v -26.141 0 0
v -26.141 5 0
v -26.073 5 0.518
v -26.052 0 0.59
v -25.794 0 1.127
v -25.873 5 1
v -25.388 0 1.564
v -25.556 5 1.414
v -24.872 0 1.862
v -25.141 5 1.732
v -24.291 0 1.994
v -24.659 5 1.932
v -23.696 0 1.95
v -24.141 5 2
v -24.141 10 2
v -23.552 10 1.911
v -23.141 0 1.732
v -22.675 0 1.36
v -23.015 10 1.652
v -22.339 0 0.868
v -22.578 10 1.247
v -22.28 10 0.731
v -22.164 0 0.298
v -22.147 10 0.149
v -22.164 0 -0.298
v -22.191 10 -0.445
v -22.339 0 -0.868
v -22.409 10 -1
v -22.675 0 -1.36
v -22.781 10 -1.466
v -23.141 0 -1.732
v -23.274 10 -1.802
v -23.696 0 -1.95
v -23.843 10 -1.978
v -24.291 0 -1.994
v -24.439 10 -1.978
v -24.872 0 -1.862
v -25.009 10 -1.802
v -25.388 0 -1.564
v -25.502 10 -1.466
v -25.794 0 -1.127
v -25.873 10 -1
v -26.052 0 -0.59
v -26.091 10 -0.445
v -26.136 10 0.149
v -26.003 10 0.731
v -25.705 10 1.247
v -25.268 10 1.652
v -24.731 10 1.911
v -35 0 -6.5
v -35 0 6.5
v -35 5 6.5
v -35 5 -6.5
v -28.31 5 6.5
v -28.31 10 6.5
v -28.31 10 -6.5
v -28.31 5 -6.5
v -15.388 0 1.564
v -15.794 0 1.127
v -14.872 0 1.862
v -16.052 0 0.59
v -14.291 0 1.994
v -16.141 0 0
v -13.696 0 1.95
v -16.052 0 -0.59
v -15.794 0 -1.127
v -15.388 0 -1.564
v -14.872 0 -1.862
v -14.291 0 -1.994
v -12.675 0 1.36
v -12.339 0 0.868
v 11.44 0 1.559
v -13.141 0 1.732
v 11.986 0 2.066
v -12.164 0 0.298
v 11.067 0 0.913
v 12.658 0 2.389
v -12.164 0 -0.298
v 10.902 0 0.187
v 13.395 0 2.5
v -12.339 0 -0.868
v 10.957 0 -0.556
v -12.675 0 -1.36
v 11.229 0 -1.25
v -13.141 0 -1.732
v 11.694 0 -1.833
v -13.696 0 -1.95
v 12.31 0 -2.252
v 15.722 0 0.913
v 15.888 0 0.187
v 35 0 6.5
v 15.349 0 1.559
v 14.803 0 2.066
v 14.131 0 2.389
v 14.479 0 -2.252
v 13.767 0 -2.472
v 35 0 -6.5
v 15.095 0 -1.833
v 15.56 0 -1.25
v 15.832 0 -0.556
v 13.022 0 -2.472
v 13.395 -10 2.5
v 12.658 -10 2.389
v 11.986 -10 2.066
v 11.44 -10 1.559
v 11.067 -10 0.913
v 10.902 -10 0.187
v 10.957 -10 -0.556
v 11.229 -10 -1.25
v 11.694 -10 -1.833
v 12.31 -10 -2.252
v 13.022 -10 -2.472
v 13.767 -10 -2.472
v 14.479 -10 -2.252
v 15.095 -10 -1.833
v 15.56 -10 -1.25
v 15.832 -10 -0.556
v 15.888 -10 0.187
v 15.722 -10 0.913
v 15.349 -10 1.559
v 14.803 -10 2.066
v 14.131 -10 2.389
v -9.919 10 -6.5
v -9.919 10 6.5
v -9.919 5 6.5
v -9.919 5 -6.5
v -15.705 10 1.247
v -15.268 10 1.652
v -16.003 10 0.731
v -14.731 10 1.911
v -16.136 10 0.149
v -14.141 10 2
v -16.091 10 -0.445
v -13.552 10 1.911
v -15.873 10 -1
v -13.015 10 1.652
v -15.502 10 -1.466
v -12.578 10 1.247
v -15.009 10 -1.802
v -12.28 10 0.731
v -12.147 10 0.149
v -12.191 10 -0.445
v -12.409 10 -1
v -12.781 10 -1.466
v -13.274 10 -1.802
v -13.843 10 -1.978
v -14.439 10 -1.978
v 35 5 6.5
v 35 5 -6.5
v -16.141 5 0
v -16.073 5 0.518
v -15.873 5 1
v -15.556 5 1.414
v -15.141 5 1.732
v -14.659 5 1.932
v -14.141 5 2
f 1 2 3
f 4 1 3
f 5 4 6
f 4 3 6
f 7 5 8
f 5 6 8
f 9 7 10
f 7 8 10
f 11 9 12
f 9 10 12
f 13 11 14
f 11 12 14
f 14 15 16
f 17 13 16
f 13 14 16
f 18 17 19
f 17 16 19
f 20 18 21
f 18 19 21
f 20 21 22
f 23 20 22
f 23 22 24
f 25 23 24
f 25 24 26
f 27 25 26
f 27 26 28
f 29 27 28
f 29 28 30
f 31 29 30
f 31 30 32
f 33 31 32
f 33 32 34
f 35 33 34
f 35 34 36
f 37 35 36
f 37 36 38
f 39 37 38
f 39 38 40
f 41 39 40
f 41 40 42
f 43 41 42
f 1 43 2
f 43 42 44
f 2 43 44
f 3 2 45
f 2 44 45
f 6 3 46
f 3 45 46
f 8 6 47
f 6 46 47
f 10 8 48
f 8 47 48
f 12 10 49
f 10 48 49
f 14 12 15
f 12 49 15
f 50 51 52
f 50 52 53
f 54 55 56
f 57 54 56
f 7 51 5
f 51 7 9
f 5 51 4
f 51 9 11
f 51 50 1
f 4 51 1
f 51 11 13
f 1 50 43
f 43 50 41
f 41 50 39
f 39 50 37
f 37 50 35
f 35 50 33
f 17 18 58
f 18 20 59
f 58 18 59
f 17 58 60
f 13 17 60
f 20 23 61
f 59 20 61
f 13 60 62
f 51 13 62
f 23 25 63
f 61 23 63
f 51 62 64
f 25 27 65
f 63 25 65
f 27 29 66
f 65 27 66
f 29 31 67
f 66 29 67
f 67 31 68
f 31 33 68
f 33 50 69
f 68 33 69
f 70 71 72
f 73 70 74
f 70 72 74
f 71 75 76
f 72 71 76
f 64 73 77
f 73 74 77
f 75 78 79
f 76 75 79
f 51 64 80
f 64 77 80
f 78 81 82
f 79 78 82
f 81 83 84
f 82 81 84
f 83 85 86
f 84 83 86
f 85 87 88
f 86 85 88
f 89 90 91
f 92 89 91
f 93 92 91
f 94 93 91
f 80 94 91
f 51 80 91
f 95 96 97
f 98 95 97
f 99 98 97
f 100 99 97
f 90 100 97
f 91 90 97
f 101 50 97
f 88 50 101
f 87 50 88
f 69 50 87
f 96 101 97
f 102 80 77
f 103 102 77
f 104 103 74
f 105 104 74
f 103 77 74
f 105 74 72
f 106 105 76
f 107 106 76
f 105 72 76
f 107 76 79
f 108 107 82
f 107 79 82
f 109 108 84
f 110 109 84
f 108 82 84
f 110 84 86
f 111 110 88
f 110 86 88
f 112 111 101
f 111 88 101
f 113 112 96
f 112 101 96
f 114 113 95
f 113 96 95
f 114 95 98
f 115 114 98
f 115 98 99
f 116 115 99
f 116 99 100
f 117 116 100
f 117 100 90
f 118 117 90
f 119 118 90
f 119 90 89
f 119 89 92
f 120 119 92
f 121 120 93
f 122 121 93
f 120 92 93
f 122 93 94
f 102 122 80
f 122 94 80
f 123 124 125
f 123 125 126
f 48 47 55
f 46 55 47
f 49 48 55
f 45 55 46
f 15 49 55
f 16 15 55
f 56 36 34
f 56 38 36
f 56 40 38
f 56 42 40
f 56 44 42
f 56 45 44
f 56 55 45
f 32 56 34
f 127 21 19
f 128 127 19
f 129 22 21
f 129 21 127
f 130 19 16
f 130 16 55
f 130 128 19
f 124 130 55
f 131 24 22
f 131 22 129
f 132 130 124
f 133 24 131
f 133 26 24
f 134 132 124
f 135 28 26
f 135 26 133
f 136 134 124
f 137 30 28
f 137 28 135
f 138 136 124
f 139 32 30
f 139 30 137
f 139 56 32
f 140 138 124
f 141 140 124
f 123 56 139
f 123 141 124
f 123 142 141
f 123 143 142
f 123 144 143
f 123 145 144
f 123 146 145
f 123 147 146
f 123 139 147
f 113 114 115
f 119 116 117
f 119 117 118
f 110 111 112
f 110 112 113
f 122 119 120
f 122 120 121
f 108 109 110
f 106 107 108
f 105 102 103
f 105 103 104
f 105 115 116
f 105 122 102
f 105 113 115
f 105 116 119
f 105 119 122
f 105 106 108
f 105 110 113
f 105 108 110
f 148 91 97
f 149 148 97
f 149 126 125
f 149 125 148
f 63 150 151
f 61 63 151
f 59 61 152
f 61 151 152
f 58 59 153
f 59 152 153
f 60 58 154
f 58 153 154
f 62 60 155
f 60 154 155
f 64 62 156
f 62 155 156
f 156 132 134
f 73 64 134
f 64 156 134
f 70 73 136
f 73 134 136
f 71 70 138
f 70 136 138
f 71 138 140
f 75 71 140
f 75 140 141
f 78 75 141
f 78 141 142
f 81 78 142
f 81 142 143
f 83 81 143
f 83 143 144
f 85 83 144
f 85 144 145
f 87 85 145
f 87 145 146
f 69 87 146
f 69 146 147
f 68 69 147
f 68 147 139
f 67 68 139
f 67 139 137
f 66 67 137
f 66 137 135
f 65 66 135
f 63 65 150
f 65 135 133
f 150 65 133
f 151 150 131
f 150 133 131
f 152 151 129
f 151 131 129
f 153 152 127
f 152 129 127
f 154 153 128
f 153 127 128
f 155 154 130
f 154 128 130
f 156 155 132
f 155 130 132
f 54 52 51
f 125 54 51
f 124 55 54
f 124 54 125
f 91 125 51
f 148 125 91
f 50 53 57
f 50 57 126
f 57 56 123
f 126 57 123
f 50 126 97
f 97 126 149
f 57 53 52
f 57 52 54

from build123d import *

# Parameters (mm, degrees)
SKETCH1_W           = 70
SKETCH1_H           = 13
BOSS_EXTRUDE1_DEPTH = 5
SKETCH2_R           = 2
CUT_EXTRUDE1_DEPTH  = 36.947878936
BOSS_EXTRUDE3_START = 5
SKETCH2_3_W         = 18.390349325
SKETCH2_3_H         = 13
SKETCH2_3_R         = 2
BOSS_EXTRUDE3_DEPTH = 5
SKETCH3_R           = 2.5
BOSS_EXTRUDE4_DEPTH = 10


with BuildPart() as part:
    # Sketch1 → Boss-Extrude1 (new body)
    with BuildSketch(Plane(origin=(0, 0, 0), x_dir=(1, 0, 0), z_dir=(0, 1, 0))):
        Rectangle(SKETCH1_W, SKETCH1_H)
    extrude(amount=BOSS_EXTRUDE1_DEPTH)

    # Sketch2 → Cut-Extrude1 (cut, through all)
    with BuildSketch(Plane(origin=(0, 5, 0), x_dir=(1, 0, 0), z_dir=(0, 1, 0))):
        with Locations((-24.141309667, 0)):
            Circle(SKETCH2_R)
        with Locations((-14.141309667, 0)):
            Circle(SKETCH2_R)
    extrude(amount=-CUT_EXTRUDE1_DEPTH, mode=Mode.SUBTRACT)

    # Sketch2<3> → Boss-Extrude3 (add)
    with BuildSketch(Plane(origin=(0, 5, 0), x_dir=(1, 0, 0), z_dir=(0, 1, 0)).offset(BOSS_EXTRUDE3_START)):
        with Locations((-19.114378827, 0)):
            Rectangle(SKETCH2_3_W, SKETCH2_3_H)
        with Locations((-24.141309667, 0)):
            Circle(SKETCH2_3_R, mode=Mode.SUBTRACT)
        with Locations((-14.141309667, 0)):
            Circle(SKETCH2_3_R, mode=Mode.SUBTRACT)
    extrude(amount=-BOSS_EXTRUDE3_DEPTH)

    # Sketch3 → Boss-Extrude4 (add)
    with BuildSketch(Plane(origin=(0, 0, 0), x_dir=(-1, 0, 0), z_dir=(0, -1, 0))):
        with Locations((-13.394545769, 0)):
            Circle(SKETCH3_R)
    extrude(amount=BOSS_EXTRUDE4_DEPTH)


solid = part.part
